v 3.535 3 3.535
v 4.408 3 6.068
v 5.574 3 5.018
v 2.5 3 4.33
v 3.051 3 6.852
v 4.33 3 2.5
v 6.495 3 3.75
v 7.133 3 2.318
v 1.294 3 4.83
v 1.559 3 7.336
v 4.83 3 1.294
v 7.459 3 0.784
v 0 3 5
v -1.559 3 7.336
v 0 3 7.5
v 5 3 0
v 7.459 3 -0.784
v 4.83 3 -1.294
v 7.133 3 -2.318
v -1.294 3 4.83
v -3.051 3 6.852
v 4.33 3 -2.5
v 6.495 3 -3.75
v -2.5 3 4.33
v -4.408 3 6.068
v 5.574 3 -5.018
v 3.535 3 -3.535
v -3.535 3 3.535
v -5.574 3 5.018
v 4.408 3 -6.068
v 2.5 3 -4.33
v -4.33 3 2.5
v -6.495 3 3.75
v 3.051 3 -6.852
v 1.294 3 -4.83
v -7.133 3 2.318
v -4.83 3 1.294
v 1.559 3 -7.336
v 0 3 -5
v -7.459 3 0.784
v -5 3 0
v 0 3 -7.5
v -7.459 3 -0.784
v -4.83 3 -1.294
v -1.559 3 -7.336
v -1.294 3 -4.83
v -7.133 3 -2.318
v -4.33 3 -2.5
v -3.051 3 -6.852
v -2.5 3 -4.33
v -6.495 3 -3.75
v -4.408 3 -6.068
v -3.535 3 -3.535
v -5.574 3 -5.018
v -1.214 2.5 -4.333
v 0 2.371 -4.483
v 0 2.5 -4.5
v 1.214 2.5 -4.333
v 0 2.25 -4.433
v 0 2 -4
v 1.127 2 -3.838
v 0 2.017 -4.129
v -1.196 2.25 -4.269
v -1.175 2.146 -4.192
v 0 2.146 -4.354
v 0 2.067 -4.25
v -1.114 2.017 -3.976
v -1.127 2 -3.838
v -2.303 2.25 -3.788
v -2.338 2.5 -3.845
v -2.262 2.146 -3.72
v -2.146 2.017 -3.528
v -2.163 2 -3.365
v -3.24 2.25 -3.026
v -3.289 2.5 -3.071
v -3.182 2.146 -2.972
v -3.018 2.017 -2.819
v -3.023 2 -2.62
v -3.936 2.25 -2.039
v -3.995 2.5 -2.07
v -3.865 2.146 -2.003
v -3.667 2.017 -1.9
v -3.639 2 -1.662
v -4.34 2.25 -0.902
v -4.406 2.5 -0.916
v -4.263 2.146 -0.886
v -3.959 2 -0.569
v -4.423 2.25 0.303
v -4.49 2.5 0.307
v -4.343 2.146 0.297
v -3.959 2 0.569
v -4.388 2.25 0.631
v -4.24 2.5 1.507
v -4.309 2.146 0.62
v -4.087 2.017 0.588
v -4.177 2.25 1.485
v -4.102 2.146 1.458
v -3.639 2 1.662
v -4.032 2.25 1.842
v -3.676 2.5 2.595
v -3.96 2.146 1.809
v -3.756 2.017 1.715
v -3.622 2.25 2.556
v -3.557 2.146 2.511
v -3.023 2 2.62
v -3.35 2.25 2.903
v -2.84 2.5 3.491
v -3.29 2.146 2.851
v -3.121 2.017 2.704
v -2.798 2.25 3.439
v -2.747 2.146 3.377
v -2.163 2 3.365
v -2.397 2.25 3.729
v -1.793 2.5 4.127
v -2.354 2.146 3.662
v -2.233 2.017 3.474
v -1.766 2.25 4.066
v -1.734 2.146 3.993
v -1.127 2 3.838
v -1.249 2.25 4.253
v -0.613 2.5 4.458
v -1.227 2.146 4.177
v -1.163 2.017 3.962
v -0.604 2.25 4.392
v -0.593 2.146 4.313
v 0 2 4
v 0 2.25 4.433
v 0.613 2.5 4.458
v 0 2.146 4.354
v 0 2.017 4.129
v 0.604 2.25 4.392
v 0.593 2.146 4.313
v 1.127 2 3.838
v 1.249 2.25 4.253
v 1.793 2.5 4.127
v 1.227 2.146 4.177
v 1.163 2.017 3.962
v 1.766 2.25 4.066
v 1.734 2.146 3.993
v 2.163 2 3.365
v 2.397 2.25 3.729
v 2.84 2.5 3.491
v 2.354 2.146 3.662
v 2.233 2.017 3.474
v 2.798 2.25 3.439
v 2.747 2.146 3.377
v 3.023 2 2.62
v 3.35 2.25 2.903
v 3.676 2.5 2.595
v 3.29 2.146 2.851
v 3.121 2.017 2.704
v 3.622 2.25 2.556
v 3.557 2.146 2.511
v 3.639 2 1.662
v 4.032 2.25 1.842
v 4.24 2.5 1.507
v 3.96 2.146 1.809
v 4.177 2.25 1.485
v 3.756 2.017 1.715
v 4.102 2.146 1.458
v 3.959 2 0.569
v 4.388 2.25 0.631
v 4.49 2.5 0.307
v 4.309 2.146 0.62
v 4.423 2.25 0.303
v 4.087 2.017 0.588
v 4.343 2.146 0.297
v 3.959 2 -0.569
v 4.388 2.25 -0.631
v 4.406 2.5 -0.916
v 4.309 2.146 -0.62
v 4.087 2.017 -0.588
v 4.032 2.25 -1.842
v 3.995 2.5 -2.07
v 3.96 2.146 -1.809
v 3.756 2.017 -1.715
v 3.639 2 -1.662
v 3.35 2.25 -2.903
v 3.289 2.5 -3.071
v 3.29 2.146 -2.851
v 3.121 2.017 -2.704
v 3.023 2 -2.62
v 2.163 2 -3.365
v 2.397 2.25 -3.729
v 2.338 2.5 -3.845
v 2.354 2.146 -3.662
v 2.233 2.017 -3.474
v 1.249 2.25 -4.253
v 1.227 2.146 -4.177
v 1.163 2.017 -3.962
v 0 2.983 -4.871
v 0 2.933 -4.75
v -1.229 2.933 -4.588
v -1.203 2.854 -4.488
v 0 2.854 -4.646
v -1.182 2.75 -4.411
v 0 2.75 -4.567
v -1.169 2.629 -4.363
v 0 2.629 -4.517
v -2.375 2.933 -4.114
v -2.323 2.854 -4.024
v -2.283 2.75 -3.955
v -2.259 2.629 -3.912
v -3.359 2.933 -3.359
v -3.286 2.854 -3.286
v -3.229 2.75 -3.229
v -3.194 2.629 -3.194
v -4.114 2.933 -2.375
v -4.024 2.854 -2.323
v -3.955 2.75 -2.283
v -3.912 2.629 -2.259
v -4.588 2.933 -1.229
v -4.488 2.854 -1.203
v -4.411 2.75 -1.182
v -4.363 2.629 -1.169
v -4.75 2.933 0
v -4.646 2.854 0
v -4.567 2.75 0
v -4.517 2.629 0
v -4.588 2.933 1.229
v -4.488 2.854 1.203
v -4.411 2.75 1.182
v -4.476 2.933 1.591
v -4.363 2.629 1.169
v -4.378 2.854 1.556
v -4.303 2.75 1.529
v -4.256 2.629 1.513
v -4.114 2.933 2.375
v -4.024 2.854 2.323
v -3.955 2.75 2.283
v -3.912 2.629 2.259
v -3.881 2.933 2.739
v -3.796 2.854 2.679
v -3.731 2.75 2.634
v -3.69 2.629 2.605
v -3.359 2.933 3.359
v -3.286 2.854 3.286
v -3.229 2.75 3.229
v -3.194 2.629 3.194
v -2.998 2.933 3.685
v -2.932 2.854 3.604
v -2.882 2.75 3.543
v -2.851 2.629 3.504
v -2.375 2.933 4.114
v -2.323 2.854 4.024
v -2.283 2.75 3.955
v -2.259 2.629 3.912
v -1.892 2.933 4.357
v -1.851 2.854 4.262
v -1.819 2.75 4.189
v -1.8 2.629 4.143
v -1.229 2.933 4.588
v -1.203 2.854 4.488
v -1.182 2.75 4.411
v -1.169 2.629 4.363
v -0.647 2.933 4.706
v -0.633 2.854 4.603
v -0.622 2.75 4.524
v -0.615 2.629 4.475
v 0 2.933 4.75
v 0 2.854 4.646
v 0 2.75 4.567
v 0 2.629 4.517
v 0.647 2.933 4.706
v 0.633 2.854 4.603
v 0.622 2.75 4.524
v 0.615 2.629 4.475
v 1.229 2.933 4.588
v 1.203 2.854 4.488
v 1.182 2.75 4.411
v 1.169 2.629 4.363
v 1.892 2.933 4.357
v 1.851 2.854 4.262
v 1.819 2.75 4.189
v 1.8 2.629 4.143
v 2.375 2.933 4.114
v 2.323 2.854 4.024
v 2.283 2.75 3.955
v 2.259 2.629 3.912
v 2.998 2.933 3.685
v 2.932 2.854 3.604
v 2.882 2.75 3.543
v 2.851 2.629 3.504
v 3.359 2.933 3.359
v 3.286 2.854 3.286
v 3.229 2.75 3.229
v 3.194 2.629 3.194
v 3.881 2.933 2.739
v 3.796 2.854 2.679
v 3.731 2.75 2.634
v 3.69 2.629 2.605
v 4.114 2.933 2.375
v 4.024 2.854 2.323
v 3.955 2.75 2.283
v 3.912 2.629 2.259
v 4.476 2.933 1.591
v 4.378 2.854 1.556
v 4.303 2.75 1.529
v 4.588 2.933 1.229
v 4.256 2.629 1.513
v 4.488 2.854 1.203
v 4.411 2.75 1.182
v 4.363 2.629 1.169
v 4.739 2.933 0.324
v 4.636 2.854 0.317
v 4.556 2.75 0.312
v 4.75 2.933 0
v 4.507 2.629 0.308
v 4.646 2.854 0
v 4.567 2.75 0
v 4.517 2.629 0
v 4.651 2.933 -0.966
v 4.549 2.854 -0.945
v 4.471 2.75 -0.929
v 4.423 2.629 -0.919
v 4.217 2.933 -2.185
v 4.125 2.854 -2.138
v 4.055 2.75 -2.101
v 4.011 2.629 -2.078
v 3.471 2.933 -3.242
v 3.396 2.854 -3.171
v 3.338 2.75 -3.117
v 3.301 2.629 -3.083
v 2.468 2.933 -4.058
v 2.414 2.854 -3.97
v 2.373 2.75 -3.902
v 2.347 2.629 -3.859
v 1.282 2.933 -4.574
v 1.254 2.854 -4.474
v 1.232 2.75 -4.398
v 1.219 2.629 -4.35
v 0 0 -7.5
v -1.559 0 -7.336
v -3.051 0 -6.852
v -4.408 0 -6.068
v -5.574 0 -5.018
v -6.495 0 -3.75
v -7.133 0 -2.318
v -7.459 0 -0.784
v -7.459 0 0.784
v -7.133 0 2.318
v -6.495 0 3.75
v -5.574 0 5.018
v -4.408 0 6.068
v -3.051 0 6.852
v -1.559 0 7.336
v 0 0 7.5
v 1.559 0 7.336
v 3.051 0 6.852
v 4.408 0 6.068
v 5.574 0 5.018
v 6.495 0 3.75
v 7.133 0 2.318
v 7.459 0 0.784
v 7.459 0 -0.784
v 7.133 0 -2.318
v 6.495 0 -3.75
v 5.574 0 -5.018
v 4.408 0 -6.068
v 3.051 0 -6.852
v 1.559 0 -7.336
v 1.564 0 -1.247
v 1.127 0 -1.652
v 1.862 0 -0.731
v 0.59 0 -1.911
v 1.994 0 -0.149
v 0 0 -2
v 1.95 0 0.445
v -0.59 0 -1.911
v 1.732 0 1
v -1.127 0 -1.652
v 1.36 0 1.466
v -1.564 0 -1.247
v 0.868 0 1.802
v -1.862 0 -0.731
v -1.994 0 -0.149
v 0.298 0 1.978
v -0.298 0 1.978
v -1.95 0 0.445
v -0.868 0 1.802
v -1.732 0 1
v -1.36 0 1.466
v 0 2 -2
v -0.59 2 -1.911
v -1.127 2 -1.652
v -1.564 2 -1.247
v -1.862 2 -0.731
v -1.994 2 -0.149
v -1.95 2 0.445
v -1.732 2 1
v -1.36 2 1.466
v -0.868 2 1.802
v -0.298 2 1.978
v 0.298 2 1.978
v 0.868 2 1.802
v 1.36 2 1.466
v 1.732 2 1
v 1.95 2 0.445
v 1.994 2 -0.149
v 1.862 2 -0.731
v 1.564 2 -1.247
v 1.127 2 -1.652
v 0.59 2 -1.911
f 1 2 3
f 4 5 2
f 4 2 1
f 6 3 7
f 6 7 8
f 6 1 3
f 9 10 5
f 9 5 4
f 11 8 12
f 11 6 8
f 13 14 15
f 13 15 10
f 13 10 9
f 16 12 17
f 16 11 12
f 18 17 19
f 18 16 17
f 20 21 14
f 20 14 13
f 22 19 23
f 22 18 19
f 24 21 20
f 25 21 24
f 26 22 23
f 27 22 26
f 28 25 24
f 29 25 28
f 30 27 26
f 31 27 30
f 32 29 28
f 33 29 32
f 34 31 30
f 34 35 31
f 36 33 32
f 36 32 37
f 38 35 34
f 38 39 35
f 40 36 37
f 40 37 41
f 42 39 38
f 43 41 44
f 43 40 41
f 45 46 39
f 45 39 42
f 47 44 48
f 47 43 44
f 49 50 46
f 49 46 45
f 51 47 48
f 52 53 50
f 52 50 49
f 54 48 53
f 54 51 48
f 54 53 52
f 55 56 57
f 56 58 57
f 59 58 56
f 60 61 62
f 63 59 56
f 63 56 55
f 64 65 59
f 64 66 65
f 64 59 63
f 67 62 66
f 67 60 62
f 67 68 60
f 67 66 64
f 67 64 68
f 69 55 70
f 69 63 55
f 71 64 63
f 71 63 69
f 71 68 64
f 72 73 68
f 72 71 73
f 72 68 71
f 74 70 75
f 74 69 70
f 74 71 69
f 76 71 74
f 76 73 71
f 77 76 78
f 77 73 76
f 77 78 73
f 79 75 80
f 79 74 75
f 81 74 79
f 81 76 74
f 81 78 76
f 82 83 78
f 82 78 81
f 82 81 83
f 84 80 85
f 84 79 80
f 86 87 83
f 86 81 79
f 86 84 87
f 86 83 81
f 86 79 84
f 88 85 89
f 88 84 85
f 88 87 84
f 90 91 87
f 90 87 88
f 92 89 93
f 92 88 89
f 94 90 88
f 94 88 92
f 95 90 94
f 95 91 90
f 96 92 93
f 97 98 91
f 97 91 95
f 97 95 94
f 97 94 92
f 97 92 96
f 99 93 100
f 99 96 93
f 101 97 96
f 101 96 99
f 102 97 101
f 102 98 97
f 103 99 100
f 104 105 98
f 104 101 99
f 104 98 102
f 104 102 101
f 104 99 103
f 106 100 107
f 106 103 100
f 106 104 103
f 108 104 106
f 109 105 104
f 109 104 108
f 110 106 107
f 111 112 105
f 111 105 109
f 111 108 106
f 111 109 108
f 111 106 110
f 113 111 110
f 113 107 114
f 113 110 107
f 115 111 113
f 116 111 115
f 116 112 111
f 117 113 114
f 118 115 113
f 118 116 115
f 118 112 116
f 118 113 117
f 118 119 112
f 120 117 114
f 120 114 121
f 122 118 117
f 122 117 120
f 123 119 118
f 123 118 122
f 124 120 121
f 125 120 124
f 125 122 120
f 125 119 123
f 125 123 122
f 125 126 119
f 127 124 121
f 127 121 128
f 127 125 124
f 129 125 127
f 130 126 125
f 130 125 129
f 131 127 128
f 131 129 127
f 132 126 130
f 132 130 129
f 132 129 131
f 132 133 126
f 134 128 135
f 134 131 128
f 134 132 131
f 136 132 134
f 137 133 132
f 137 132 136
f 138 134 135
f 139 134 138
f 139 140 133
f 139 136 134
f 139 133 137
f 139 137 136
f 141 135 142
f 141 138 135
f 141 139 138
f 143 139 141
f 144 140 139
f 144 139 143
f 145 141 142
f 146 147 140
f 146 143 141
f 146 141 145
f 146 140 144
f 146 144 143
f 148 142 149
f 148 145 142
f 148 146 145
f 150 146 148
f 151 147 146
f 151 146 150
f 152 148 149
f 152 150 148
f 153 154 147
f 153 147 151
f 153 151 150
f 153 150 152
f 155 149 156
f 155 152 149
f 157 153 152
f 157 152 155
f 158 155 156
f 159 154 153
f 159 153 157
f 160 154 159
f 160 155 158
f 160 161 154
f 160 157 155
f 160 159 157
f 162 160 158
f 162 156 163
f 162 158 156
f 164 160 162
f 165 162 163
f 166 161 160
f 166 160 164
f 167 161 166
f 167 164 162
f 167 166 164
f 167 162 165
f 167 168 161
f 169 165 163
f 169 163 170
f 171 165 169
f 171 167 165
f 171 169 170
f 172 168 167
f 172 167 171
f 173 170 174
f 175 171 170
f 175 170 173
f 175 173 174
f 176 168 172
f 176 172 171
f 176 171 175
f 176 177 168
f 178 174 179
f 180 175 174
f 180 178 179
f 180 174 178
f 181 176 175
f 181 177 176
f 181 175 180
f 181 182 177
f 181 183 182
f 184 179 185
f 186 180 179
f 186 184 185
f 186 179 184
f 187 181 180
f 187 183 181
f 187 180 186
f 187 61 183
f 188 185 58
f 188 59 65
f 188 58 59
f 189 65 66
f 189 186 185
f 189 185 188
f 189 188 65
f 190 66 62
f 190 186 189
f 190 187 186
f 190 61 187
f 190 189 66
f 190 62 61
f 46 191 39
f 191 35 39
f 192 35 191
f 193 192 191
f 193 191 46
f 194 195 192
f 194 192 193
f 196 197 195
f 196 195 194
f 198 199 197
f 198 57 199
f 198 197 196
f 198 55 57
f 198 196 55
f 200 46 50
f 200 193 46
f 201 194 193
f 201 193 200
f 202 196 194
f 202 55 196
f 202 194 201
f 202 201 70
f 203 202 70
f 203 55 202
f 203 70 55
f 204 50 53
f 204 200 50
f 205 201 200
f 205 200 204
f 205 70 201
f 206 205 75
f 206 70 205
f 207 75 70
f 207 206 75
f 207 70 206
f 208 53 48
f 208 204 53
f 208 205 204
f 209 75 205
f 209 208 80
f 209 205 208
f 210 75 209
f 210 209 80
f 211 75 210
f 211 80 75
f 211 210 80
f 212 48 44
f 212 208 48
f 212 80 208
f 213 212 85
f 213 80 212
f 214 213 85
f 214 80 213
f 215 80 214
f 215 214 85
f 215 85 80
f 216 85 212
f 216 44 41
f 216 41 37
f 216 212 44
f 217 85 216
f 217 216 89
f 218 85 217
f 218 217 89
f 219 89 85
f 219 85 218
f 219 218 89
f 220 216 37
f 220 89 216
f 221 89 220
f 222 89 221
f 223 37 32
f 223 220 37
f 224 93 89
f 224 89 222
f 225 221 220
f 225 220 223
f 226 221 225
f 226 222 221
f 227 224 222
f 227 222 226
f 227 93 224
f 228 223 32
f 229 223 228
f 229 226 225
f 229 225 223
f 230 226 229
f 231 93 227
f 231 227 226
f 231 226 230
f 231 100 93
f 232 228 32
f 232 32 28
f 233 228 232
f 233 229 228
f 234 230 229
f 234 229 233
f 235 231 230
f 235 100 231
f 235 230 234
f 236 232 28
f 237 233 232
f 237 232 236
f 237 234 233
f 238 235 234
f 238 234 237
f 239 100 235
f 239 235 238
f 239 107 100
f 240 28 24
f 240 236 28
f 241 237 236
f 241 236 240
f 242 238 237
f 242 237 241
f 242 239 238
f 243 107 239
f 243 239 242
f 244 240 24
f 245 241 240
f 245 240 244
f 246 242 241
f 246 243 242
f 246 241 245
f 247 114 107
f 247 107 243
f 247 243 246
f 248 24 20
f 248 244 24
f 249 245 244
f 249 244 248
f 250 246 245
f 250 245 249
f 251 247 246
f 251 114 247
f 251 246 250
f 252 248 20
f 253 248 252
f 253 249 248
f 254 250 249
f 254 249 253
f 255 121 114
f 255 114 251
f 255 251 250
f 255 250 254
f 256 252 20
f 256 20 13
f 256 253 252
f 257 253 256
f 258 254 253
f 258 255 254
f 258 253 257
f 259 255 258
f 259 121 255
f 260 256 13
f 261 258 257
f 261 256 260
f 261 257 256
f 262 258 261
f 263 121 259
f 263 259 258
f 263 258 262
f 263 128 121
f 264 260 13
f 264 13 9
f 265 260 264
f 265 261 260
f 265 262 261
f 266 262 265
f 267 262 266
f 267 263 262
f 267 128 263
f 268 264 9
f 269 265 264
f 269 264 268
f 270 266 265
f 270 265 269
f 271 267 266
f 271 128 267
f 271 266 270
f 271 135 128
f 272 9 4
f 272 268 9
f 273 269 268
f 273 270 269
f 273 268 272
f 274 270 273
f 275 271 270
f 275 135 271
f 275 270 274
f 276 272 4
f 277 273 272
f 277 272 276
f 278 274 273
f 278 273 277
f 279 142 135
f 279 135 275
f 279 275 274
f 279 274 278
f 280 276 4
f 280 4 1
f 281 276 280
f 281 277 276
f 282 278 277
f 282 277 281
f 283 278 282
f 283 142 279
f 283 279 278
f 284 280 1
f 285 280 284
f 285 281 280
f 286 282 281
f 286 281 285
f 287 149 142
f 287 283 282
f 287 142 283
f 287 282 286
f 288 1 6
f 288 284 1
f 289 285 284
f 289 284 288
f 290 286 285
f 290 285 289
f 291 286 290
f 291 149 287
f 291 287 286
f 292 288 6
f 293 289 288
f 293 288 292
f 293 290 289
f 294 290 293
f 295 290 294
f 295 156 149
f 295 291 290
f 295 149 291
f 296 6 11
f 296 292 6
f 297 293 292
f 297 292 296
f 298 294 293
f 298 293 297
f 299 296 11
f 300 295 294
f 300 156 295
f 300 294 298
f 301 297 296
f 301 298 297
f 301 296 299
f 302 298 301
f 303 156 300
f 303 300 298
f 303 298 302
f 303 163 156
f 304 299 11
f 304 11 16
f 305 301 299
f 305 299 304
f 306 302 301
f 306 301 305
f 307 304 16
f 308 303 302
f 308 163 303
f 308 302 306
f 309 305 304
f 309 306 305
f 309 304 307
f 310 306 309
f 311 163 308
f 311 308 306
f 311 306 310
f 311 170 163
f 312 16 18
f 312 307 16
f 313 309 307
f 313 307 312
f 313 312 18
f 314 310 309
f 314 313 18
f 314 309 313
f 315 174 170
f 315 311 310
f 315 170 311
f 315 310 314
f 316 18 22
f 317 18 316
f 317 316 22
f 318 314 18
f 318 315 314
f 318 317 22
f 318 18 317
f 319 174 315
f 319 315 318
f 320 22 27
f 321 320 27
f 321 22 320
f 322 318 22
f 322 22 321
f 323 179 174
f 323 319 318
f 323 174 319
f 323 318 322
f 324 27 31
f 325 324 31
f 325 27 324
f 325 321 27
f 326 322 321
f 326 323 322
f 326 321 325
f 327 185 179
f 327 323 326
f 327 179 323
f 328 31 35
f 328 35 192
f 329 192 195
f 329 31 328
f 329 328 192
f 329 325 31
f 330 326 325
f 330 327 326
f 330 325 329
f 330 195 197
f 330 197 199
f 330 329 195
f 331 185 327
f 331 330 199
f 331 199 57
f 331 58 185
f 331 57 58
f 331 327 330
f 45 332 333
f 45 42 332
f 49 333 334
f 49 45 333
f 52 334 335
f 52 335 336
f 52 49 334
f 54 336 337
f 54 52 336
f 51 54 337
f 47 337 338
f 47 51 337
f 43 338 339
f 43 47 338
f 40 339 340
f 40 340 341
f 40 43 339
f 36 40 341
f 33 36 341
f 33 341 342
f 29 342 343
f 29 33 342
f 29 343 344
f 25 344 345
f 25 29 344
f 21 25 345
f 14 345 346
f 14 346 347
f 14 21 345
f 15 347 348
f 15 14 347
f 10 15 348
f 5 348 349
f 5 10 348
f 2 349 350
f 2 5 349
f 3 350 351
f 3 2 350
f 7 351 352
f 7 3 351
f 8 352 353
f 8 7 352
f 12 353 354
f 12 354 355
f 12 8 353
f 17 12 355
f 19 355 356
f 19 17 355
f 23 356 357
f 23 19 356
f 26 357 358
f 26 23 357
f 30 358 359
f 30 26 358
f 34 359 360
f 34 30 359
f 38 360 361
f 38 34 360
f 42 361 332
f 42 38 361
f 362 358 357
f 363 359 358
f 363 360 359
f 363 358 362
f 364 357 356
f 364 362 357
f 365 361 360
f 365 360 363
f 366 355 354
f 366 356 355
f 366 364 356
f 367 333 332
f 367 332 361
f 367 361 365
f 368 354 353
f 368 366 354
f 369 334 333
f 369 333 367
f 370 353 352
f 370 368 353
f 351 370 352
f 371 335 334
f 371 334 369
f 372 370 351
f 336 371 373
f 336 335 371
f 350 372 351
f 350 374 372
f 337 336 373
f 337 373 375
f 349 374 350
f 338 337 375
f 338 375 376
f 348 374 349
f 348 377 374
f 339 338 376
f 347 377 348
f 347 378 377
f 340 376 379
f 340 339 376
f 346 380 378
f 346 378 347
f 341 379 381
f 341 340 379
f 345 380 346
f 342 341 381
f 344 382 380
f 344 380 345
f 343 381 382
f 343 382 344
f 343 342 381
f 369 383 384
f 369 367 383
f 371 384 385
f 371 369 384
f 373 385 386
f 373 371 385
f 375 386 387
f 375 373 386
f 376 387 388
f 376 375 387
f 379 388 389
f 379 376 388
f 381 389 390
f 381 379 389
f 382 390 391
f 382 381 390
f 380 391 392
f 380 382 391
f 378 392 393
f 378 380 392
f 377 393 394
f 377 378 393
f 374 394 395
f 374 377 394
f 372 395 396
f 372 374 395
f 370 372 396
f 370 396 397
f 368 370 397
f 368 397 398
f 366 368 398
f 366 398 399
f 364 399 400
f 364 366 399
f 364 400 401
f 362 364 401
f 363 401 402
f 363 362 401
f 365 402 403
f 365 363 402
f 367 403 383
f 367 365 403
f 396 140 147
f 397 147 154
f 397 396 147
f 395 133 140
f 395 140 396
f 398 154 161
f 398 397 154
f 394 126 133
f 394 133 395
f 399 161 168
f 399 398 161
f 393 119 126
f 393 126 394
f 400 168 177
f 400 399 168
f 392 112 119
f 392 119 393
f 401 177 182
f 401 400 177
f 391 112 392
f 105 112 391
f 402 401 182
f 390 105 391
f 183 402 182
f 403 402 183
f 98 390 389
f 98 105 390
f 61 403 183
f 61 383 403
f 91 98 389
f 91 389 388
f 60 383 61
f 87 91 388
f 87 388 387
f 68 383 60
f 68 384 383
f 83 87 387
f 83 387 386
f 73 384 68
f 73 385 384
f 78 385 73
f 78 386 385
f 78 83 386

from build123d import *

# Parameters (mm, degrees)
FILLET_1_R = 0.5


with BuildPart() as part:
    # 草图2 → 旋转1 (revolve)
    with BuildSketch(Plane.XY, mode=Mode.PRIVATE) as revolve_1_sk:
        Polygon((2, 0), (7.5, 0), (7.5, 3), (4.5, 3), (4.5, 2), (2, 2), align=None)
    revolve(revolve_1_sk.sketch.rotate(Axis((0, 0, 0), (0, 1, 0)), 90), axis=Axis((0, 0, 0), (0, 1, 0)))

    # 圆角1
    fillet_1_edges = [part.edges().sort_by_distance(p)[0] for p in [
        (0, 2, 4.5),
        (0, 3, 4.5),
    ]]
    fillet(fillet_1_edges, radius=FILLET_1_R - 0.0001)  # a hair under: the kernel refuses the full size


solid = part.part
